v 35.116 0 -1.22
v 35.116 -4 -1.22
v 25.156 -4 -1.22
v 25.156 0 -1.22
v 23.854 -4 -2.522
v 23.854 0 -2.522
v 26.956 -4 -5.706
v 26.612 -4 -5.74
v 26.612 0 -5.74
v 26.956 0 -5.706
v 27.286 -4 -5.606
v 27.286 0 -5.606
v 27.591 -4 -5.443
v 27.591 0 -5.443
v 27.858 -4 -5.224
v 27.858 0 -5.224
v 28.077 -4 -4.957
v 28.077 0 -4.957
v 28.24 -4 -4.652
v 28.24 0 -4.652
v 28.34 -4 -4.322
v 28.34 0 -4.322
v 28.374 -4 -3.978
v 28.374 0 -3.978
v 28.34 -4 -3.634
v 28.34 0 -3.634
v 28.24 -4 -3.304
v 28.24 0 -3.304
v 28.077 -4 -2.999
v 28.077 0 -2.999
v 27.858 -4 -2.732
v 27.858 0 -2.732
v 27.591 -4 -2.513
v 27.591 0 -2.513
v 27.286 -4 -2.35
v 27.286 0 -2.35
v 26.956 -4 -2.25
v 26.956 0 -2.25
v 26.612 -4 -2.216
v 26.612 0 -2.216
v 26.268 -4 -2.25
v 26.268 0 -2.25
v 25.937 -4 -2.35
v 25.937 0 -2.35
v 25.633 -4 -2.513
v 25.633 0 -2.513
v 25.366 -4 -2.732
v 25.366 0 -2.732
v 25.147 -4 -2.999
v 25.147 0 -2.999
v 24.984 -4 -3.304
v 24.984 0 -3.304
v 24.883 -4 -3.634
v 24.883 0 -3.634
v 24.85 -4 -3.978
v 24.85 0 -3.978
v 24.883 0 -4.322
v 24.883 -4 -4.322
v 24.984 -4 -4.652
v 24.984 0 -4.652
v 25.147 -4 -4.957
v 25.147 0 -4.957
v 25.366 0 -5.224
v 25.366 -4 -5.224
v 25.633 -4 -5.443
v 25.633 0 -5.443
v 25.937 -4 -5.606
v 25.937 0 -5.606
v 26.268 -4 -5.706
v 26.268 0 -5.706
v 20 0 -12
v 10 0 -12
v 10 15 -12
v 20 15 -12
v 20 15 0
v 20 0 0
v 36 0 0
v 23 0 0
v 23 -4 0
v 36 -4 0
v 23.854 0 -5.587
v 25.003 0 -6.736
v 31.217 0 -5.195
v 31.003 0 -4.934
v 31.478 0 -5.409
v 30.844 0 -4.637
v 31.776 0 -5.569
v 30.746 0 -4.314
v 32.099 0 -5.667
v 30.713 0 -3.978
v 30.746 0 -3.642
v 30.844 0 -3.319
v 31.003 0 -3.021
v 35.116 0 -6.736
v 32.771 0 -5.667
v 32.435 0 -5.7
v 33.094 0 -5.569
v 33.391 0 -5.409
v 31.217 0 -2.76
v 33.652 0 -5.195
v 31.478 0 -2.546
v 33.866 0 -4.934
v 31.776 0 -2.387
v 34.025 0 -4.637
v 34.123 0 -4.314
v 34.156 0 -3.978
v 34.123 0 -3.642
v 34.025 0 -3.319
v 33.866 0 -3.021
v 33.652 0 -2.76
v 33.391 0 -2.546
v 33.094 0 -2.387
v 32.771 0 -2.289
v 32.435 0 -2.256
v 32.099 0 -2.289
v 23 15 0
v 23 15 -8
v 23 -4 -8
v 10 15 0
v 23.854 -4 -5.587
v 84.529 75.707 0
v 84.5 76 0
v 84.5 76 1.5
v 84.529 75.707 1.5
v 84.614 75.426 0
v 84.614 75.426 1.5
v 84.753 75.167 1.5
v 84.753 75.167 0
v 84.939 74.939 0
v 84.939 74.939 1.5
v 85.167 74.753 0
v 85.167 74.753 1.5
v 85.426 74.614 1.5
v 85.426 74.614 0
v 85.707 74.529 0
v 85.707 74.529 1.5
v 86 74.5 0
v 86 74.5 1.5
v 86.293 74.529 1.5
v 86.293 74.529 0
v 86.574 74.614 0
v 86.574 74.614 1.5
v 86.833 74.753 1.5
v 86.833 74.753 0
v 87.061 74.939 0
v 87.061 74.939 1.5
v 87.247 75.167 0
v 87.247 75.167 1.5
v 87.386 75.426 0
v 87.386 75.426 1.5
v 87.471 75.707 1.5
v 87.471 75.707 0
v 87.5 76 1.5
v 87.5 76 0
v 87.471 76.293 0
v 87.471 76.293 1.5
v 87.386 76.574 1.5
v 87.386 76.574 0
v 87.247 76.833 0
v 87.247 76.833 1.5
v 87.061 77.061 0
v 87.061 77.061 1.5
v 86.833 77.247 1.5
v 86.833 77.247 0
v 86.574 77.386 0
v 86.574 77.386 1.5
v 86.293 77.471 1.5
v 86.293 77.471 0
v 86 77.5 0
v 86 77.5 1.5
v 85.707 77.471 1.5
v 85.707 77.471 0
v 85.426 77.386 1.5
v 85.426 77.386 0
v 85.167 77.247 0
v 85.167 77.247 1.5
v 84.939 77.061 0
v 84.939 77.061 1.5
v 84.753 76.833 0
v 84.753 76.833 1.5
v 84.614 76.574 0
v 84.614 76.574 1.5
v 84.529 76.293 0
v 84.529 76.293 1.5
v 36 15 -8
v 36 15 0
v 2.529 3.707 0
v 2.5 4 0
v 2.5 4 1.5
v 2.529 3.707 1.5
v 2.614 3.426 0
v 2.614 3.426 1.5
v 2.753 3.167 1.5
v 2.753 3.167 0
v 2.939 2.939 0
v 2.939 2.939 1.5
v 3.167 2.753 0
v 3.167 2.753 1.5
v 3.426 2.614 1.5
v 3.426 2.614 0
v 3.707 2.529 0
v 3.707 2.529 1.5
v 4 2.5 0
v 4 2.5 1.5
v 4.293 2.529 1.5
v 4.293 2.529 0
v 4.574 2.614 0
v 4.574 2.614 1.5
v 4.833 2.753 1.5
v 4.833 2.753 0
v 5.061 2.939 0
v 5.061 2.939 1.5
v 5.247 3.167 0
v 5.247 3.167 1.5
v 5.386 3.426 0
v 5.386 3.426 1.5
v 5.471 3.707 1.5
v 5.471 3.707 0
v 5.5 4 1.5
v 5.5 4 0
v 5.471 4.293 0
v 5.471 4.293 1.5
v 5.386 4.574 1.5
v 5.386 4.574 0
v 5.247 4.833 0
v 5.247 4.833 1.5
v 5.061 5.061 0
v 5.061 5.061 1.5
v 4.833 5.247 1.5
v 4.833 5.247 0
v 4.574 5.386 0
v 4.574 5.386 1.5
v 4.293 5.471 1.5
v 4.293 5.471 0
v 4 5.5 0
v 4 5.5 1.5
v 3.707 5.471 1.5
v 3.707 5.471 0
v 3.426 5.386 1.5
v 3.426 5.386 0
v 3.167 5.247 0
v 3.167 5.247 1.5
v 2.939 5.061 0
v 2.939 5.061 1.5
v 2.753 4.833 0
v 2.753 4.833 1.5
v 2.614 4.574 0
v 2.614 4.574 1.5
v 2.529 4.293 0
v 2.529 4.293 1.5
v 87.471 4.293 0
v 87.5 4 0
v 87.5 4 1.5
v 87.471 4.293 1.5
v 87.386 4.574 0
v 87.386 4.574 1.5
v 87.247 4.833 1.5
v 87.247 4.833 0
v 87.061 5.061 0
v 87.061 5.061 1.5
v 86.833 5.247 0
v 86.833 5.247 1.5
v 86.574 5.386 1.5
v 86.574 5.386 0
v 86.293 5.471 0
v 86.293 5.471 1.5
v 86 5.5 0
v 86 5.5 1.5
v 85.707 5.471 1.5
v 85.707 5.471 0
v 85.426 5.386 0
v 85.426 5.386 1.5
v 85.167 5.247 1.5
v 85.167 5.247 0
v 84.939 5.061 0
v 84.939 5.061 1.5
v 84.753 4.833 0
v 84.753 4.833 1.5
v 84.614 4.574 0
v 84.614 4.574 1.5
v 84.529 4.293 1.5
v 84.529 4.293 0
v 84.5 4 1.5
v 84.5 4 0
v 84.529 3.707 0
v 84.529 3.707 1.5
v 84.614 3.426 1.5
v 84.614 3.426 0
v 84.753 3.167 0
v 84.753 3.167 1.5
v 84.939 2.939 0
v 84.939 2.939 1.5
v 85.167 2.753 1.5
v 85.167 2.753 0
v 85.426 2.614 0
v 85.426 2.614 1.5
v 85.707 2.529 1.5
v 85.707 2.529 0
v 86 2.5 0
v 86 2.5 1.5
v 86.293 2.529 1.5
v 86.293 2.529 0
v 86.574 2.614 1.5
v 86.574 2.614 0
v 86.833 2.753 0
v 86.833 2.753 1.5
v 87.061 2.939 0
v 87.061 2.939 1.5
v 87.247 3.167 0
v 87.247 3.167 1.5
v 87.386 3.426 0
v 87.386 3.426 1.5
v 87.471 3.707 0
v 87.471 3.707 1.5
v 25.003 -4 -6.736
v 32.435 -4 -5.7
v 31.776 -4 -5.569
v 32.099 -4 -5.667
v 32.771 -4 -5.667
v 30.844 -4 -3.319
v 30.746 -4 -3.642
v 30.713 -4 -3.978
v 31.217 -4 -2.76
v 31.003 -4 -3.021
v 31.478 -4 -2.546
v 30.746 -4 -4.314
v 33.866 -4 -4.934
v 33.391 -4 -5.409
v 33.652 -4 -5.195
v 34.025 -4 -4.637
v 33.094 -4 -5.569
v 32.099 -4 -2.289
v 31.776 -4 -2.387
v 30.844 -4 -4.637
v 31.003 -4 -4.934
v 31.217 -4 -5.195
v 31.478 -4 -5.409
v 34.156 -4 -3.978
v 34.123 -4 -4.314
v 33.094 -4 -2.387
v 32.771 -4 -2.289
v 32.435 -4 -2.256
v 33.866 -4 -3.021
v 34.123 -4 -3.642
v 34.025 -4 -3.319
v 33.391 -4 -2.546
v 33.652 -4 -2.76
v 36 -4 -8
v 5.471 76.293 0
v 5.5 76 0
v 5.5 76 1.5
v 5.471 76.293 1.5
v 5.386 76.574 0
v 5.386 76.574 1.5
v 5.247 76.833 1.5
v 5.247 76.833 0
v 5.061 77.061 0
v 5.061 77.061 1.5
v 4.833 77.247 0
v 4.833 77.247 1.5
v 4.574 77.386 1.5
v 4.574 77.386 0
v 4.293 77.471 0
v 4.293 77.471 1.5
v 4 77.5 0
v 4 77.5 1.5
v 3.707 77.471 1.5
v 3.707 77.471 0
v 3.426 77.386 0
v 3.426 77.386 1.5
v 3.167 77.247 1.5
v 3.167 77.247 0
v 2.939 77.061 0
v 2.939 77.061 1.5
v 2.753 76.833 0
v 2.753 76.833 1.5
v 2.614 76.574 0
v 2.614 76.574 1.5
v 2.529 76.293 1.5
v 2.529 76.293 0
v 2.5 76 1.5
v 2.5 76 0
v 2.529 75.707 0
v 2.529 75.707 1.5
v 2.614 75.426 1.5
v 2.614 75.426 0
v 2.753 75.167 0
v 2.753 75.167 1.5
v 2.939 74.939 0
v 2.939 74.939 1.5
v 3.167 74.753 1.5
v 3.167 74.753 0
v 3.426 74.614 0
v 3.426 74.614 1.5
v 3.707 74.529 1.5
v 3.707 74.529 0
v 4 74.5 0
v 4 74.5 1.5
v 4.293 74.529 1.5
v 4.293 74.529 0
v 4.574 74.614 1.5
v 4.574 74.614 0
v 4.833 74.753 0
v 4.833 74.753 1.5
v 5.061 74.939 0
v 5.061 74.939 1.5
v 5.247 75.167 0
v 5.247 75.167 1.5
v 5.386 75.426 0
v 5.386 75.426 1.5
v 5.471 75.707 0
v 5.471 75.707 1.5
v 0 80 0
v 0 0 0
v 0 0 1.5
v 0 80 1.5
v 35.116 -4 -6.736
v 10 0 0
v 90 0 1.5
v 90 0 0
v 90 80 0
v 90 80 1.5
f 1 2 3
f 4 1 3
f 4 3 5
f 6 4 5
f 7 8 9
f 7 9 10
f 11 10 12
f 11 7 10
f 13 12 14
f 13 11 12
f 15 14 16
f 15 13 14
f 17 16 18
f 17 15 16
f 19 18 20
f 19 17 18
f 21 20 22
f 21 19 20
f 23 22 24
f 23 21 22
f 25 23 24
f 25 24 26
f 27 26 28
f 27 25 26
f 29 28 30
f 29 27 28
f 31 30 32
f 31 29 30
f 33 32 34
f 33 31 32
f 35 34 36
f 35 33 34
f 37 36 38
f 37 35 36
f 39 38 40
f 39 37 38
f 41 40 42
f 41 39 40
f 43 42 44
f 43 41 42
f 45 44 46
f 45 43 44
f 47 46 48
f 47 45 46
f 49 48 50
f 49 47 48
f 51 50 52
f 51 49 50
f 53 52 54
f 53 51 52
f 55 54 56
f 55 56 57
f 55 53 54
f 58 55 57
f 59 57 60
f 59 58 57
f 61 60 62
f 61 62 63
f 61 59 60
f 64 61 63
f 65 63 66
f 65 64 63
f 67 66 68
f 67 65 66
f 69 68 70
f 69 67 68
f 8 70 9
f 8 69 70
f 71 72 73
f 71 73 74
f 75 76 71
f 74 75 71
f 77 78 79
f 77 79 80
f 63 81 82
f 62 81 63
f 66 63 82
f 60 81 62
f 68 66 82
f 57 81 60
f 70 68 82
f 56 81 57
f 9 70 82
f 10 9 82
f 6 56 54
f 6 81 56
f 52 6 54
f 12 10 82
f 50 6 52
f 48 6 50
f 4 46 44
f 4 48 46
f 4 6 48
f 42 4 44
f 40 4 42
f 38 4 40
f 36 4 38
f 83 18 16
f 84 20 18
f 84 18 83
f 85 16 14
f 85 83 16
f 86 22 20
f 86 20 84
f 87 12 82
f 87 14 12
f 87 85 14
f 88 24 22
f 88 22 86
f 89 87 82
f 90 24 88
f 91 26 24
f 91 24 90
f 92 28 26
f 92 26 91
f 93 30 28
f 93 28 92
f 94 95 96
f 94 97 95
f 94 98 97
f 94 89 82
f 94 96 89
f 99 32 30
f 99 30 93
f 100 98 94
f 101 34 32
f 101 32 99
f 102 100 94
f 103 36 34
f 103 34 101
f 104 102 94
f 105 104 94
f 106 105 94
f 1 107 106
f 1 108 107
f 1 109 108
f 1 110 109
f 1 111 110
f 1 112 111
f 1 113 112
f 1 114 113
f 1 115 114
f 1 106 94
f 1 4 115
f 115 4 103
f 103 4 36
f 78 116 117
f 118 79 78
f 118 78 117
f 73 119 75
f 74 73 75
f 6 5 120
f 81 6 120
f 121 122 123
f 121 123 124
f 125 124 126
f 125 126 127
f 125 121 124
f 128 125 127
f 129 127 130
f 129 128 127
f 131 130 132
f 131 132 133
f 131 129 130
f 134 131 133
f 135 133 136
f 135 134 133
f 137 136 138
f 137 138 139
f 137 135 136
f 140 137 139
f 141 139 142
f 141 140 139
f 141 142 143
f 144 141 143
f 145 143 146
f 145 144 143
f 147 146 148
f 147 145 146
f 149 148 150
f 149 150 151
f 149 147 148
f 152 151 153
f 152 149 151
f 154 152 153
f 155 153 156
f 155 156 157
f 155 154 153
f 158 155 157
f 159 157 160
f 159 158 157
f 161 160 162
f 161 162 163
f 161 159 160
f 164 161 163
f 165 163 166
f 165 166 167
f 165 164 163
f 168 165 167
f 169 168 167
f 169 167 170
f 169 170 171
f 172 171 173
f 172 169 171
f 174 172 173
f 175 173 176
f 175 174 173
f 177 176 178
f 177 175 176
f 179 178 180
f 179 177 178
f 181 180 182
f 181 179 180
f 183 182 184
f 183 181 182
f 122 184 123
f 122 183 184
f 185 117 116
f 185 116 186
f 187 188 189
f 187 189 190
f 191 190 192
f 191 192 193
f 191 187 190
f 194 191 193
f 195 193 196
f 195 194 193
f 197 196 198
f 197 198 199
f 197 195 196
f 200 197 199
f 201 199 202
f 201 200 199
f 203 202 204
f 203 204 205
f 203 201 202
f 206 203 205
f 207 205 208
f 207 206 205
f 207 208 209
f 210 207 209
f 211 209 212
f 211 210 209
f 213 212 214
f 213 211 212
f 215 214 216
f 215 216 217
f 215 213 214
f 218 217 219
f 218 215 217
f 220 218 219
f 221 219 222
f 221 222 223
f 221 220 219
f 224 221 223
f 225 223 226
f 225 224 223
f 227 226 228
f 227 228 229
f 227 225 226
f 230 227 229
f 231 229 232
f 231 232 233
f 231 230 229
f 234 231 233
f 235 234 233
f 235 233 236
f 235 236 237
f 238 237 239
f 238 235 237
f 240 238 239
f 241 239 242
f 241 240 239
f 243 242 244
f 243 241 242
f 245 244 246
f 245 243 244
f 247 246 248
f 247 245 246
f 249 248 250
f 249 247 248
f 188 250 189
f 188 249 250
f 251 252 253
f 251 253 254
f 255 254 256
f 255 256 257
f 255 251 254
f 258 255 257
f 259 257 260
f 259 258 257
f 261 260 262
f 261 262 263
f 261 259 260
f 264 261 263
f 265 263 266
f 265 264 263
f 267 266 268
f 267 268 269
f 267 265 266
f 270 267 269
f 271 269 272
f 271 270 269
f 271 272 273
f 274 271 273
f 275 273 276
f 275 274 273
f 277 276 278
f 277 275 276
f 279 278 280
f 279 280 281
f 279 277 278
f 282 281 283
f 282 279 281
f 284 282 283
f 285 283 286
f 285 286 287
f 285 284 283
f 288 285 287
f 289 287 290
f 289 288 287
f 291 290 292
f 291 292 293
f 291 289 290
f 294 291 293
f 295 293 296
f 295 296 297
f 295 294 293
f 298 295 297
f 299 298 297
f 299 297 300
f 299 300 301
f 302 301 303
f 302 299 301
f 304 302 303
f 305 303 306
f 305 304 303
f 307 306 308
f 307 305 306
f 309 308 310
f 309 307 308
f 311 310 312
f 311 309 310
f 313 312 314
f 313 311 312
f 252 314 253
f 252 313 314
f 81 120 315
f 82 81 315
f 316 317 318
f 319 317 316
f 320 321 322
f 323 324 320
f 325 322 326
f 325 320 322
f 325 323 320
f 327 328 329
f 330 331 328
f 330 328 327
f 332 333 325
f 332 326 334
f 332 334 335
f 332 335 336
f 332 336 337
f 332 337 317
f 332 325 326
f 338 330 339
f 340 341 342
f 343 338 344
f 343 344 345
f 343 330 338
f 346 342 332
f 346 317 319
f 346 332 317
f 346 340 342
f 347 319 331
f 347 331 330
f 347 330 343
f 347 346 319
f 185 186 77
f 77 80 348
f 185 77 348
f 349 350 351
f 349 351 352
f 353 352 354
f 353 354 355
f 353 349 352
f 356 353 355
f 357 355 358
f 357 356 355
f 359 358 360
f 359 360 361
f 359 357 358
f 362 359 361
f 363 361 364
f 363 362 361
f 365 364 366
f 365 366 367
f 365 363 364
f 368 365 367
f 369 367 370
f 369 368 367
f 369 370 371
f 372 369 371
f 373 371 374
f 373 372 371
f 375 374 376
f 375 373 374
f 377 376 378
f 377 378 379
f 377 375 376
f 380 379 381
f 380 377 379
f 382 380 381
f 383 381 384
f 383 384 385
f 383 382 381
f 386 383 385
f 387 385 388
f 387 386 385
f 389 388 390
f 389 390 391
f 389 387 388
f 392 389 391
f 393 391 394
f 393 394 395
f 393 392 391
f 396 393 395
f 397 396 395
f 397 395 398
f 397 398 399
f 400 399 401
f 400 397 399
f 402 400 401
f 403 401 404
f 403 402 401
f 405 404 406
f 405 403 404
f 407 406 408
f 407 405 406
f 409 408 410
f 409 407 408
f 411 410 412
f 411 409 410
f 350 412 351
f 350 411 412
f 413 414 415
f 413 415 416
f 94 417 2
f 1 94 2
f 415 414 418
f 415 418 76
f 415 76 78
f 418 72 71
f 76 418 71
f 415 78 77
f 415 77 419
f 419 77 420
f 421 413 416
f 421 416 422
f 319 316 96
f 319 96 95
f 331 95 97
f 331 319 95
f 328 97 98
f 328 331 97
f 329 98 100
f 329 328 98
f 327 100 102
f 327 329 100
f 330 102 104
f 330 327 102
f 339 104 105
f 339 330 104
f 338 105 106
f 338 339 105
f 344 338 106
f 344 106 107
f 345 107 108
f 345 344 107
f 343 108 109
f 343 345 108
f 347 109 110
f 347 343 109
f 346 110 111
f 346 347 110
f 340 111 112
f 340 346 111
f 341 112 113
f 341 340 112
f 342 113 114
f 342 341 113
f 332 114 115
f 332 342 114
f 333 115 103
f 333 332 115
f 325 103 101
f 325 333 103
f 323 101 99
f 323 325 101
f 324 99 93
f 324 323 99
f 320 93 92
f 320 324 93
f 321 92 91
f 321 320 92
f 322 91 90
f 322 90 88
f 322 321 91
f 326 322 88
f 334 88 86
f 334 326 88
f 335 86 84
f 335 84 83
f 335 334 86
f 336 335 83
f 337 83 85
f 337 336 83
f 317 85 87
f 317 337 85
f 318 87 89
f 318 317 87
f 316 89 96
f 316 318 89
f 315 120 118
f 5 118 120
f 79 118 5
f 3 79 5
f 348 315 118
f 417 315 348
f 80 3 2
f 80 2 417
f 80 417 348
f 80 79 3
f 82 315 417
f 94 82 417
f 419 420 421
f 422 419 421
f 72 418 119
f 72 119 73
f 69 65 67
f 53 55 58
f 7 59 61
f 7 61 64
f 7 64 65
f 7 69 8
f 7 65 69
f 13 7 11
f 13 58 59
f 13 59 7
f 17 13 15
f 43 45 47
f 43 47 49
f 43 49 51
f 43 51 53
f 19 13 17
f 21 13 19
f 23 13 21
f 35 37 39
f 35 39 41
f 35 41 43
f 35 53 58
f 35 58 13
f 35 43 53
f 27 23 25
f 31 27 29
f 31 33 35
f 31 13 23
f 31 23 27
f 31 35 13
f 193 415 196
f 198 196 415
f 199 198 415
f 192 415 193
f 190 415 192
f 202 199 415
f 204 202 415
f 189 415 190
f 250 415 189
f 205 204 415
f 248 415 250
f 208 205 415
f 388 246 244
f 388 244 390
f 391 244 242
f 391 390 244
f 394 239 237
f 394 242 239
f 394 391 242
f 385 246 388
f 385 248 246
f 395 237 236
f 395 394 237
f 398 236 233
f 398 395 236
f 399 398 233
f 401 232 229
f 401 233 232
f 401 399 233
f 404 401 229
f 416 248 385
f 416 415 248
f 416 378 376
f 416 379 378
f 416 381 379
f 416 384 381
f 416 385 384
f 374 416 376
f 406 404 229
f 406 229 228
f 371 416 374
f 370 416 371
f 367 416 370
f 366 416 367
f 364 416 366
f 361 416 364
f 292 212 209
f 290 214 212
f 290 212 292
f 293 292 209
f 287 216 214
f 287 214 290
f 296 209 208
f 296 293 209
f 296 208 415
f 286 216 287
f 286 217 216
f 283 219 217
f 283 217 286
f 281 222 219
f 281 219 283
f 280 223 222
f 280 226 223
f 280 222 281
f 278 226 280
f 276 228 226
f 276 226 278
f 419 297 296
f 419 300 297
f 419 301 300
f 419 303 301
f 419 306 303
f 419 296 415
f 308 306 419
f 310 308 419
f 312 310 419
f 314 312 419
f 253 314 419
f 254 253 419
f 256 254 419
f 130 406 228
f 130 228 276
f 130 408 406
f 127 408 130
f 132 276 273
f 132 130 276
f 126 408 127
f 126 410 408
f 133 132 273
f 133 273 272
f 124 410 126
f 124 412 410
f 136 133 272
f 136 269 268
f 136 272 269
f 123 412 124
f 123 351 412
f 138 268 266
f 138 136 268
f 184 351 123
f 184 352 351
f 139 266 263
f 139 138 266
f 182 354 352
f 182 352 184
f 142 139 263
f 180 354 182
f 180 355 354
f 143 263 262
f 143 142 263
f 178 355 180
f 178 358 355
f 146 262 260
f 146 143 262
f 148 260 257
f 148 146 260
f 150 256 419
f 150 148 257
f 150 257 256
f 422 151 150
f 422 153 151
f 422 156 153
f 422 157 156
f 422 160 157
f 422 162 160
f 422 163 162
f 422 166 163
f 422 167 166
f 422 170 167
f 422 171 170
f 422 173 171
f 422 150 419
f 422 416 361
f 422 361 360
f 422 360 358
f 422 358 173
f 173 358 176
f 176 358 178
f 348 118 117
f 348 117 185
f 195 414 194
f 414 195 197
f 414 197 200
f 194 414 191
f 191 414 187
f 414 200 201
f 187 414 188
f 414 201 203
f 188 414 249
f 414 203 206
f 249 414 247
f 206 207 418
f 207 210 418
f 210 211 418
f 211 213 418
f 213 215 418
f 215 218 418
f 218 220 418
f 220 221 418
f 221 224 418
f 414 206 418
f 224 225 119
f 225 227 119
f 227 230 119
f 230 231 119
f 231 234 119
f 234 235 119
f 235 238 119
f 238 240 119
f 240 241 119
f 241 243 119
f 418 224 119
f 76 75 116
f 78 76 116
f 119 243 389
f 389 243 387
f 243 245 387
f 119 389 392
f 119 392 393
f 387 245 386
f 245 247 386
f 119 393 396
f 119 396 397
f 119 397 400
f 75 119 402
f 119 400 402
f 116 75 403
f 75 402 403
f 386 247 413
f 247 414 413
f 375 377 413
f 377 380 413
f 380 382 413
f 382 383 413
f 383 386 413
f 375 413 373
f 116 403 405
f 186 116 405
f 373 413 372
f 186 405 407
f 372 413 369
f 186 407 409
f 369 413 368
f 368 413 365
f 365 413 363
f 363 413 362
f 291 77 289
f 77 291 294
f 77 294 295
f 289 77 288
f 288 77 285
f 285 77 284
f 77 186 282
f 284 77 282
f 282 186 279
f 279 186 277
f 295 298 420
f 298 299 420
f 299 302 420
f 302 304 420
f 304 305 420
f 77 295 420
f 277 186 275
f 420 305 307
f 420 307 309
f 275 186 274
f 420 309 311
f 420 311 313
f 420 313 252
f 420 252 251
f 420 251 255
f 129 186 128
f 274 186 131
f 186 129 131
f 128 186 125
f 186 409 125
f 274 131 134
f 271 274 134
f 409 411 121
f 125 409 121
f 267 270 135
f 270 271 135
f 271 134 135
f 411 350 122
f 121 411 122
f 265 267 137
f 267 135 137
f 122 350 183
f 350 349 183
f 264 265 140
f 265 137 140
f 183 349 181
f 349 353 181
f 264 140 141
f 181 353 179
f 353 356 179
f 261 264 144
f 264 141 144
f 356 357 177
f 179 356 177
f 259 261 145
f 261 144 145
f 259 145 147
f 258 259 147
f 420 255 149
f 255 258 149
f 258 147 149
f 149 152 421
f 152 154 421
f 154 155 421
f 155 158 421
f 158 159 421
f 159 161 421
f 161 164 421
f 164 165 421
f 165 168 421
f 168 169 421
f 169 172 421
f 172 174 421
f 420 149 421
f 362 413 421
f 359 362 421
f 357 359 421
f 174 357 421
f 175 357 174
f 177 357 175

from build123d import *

# Parameters (mm, degrees)
SKETCH_1_W          = 90
SKETCH_1_H          = 80
SKETCH_1_R          = 1.5
EXTRUDE_1_DEPTH     = 1.5
SKETCH_2_W          = 13
SKETCH_2_H          = 8
EXTRUDE_2_DEPTH     = 4
SKETCH_3_W          = 13
SKETCH_3_H          = 8
SKETCH_3_W_2        = 10
SKETCH_3_H_2        = 12
EXTRUDE_3_DEPTH     = 15
SKETCH_4_R          = 1.762202075
SKETCH_4_R_2        = 1.721763756
CUT_EXTRUDE_1_DEPTH = 4


with BuildPart() as part:
    # 草图1 → 凸台-拉伸1 (new body)
    with BuildSketch(Plane.XY):
        with Locations((45, 40)):
            Rectangle(SKETCH_1_W, SKETCH_1_H)
        with Locations((4, 76)):
            Circle(SKETCH_1_R, mode=Mode.SUBTRACT)
        with Locations(Location((86, 76, 0), (0, 0, 180))):
            Circle(SKETCH_1_R, mode=Mode.SUBTRACT)
        with Locations((86, 4)):
            Circle(SKETCH_1_R, mode=Mode.SUBTRACT)
        with Locations(Location((4, 4, 0), (0, 0, 180))):
            Circle(SKETCH_1_R, mode=Mode.SUBTRACT)
    extrude(amount=EXTRUDE_1_DEPTH)



with BuildPart() as body_2:
    # 草图2 → 凸台-拉伸2 (new body)
    with BuildSketch(Plane.XZ):
        with Locations((29.5, -4)):
            Rectangle(SKETCH_2_W, SKETCH_2_H)
    extrude(amount=EXTRUDE_2_DEPTH)


with BuildPart() as part_1:
    add(part.part)

    add(body_2.part)  # 凸台-拉伸3 merges body 2
    # 草图3 → 凸台-拉伸3 (add)
    with BuildSketch(Plane(origin=(0, 0, 0), x_dir=(1, 0, 0), z_dir=(0, 1, 0))):
        with Locations((29.5, 4)):
            Rectangle(SKETCH_3_W, SKETCH_3_H)
        with Locations((15, 6)):
            Rectangle(SKETCH_3_W_2, SKETCH_3_H_2)
    extrude(amount=EXTRUDE_3_DEPTH)

    # 草图4 → 切除-拉伸1 (cut)
    with BuildSketch(Plane.XZ.offset(4)):
        Polygon((25.156072285, -1.21963674), (23.853575099, -2.522133926), (23.853575099, -5.586833186), (25.002837322, -6.736095409), (35.116344883, -6.736095409), (35.116344883, -1.21963674), align=None)
        with Locations(Location((26.611804434, -3.977866074, 0), (0, 0, 270))):
            Circle(SKETCH_4_R, mode=Mode.SUBTRACT)
        with Locations(Location((32.43473303, -3.977866074, 0), (0, 0, 270))):
            Circle(SKETCH_4_R_2, mode=Mode.SUBTRACT)
    extrude(amount=-CUT_EXTRUDE_1_DEPTH, mode=Mode.SUBTRACT)


solid = part_1.part
